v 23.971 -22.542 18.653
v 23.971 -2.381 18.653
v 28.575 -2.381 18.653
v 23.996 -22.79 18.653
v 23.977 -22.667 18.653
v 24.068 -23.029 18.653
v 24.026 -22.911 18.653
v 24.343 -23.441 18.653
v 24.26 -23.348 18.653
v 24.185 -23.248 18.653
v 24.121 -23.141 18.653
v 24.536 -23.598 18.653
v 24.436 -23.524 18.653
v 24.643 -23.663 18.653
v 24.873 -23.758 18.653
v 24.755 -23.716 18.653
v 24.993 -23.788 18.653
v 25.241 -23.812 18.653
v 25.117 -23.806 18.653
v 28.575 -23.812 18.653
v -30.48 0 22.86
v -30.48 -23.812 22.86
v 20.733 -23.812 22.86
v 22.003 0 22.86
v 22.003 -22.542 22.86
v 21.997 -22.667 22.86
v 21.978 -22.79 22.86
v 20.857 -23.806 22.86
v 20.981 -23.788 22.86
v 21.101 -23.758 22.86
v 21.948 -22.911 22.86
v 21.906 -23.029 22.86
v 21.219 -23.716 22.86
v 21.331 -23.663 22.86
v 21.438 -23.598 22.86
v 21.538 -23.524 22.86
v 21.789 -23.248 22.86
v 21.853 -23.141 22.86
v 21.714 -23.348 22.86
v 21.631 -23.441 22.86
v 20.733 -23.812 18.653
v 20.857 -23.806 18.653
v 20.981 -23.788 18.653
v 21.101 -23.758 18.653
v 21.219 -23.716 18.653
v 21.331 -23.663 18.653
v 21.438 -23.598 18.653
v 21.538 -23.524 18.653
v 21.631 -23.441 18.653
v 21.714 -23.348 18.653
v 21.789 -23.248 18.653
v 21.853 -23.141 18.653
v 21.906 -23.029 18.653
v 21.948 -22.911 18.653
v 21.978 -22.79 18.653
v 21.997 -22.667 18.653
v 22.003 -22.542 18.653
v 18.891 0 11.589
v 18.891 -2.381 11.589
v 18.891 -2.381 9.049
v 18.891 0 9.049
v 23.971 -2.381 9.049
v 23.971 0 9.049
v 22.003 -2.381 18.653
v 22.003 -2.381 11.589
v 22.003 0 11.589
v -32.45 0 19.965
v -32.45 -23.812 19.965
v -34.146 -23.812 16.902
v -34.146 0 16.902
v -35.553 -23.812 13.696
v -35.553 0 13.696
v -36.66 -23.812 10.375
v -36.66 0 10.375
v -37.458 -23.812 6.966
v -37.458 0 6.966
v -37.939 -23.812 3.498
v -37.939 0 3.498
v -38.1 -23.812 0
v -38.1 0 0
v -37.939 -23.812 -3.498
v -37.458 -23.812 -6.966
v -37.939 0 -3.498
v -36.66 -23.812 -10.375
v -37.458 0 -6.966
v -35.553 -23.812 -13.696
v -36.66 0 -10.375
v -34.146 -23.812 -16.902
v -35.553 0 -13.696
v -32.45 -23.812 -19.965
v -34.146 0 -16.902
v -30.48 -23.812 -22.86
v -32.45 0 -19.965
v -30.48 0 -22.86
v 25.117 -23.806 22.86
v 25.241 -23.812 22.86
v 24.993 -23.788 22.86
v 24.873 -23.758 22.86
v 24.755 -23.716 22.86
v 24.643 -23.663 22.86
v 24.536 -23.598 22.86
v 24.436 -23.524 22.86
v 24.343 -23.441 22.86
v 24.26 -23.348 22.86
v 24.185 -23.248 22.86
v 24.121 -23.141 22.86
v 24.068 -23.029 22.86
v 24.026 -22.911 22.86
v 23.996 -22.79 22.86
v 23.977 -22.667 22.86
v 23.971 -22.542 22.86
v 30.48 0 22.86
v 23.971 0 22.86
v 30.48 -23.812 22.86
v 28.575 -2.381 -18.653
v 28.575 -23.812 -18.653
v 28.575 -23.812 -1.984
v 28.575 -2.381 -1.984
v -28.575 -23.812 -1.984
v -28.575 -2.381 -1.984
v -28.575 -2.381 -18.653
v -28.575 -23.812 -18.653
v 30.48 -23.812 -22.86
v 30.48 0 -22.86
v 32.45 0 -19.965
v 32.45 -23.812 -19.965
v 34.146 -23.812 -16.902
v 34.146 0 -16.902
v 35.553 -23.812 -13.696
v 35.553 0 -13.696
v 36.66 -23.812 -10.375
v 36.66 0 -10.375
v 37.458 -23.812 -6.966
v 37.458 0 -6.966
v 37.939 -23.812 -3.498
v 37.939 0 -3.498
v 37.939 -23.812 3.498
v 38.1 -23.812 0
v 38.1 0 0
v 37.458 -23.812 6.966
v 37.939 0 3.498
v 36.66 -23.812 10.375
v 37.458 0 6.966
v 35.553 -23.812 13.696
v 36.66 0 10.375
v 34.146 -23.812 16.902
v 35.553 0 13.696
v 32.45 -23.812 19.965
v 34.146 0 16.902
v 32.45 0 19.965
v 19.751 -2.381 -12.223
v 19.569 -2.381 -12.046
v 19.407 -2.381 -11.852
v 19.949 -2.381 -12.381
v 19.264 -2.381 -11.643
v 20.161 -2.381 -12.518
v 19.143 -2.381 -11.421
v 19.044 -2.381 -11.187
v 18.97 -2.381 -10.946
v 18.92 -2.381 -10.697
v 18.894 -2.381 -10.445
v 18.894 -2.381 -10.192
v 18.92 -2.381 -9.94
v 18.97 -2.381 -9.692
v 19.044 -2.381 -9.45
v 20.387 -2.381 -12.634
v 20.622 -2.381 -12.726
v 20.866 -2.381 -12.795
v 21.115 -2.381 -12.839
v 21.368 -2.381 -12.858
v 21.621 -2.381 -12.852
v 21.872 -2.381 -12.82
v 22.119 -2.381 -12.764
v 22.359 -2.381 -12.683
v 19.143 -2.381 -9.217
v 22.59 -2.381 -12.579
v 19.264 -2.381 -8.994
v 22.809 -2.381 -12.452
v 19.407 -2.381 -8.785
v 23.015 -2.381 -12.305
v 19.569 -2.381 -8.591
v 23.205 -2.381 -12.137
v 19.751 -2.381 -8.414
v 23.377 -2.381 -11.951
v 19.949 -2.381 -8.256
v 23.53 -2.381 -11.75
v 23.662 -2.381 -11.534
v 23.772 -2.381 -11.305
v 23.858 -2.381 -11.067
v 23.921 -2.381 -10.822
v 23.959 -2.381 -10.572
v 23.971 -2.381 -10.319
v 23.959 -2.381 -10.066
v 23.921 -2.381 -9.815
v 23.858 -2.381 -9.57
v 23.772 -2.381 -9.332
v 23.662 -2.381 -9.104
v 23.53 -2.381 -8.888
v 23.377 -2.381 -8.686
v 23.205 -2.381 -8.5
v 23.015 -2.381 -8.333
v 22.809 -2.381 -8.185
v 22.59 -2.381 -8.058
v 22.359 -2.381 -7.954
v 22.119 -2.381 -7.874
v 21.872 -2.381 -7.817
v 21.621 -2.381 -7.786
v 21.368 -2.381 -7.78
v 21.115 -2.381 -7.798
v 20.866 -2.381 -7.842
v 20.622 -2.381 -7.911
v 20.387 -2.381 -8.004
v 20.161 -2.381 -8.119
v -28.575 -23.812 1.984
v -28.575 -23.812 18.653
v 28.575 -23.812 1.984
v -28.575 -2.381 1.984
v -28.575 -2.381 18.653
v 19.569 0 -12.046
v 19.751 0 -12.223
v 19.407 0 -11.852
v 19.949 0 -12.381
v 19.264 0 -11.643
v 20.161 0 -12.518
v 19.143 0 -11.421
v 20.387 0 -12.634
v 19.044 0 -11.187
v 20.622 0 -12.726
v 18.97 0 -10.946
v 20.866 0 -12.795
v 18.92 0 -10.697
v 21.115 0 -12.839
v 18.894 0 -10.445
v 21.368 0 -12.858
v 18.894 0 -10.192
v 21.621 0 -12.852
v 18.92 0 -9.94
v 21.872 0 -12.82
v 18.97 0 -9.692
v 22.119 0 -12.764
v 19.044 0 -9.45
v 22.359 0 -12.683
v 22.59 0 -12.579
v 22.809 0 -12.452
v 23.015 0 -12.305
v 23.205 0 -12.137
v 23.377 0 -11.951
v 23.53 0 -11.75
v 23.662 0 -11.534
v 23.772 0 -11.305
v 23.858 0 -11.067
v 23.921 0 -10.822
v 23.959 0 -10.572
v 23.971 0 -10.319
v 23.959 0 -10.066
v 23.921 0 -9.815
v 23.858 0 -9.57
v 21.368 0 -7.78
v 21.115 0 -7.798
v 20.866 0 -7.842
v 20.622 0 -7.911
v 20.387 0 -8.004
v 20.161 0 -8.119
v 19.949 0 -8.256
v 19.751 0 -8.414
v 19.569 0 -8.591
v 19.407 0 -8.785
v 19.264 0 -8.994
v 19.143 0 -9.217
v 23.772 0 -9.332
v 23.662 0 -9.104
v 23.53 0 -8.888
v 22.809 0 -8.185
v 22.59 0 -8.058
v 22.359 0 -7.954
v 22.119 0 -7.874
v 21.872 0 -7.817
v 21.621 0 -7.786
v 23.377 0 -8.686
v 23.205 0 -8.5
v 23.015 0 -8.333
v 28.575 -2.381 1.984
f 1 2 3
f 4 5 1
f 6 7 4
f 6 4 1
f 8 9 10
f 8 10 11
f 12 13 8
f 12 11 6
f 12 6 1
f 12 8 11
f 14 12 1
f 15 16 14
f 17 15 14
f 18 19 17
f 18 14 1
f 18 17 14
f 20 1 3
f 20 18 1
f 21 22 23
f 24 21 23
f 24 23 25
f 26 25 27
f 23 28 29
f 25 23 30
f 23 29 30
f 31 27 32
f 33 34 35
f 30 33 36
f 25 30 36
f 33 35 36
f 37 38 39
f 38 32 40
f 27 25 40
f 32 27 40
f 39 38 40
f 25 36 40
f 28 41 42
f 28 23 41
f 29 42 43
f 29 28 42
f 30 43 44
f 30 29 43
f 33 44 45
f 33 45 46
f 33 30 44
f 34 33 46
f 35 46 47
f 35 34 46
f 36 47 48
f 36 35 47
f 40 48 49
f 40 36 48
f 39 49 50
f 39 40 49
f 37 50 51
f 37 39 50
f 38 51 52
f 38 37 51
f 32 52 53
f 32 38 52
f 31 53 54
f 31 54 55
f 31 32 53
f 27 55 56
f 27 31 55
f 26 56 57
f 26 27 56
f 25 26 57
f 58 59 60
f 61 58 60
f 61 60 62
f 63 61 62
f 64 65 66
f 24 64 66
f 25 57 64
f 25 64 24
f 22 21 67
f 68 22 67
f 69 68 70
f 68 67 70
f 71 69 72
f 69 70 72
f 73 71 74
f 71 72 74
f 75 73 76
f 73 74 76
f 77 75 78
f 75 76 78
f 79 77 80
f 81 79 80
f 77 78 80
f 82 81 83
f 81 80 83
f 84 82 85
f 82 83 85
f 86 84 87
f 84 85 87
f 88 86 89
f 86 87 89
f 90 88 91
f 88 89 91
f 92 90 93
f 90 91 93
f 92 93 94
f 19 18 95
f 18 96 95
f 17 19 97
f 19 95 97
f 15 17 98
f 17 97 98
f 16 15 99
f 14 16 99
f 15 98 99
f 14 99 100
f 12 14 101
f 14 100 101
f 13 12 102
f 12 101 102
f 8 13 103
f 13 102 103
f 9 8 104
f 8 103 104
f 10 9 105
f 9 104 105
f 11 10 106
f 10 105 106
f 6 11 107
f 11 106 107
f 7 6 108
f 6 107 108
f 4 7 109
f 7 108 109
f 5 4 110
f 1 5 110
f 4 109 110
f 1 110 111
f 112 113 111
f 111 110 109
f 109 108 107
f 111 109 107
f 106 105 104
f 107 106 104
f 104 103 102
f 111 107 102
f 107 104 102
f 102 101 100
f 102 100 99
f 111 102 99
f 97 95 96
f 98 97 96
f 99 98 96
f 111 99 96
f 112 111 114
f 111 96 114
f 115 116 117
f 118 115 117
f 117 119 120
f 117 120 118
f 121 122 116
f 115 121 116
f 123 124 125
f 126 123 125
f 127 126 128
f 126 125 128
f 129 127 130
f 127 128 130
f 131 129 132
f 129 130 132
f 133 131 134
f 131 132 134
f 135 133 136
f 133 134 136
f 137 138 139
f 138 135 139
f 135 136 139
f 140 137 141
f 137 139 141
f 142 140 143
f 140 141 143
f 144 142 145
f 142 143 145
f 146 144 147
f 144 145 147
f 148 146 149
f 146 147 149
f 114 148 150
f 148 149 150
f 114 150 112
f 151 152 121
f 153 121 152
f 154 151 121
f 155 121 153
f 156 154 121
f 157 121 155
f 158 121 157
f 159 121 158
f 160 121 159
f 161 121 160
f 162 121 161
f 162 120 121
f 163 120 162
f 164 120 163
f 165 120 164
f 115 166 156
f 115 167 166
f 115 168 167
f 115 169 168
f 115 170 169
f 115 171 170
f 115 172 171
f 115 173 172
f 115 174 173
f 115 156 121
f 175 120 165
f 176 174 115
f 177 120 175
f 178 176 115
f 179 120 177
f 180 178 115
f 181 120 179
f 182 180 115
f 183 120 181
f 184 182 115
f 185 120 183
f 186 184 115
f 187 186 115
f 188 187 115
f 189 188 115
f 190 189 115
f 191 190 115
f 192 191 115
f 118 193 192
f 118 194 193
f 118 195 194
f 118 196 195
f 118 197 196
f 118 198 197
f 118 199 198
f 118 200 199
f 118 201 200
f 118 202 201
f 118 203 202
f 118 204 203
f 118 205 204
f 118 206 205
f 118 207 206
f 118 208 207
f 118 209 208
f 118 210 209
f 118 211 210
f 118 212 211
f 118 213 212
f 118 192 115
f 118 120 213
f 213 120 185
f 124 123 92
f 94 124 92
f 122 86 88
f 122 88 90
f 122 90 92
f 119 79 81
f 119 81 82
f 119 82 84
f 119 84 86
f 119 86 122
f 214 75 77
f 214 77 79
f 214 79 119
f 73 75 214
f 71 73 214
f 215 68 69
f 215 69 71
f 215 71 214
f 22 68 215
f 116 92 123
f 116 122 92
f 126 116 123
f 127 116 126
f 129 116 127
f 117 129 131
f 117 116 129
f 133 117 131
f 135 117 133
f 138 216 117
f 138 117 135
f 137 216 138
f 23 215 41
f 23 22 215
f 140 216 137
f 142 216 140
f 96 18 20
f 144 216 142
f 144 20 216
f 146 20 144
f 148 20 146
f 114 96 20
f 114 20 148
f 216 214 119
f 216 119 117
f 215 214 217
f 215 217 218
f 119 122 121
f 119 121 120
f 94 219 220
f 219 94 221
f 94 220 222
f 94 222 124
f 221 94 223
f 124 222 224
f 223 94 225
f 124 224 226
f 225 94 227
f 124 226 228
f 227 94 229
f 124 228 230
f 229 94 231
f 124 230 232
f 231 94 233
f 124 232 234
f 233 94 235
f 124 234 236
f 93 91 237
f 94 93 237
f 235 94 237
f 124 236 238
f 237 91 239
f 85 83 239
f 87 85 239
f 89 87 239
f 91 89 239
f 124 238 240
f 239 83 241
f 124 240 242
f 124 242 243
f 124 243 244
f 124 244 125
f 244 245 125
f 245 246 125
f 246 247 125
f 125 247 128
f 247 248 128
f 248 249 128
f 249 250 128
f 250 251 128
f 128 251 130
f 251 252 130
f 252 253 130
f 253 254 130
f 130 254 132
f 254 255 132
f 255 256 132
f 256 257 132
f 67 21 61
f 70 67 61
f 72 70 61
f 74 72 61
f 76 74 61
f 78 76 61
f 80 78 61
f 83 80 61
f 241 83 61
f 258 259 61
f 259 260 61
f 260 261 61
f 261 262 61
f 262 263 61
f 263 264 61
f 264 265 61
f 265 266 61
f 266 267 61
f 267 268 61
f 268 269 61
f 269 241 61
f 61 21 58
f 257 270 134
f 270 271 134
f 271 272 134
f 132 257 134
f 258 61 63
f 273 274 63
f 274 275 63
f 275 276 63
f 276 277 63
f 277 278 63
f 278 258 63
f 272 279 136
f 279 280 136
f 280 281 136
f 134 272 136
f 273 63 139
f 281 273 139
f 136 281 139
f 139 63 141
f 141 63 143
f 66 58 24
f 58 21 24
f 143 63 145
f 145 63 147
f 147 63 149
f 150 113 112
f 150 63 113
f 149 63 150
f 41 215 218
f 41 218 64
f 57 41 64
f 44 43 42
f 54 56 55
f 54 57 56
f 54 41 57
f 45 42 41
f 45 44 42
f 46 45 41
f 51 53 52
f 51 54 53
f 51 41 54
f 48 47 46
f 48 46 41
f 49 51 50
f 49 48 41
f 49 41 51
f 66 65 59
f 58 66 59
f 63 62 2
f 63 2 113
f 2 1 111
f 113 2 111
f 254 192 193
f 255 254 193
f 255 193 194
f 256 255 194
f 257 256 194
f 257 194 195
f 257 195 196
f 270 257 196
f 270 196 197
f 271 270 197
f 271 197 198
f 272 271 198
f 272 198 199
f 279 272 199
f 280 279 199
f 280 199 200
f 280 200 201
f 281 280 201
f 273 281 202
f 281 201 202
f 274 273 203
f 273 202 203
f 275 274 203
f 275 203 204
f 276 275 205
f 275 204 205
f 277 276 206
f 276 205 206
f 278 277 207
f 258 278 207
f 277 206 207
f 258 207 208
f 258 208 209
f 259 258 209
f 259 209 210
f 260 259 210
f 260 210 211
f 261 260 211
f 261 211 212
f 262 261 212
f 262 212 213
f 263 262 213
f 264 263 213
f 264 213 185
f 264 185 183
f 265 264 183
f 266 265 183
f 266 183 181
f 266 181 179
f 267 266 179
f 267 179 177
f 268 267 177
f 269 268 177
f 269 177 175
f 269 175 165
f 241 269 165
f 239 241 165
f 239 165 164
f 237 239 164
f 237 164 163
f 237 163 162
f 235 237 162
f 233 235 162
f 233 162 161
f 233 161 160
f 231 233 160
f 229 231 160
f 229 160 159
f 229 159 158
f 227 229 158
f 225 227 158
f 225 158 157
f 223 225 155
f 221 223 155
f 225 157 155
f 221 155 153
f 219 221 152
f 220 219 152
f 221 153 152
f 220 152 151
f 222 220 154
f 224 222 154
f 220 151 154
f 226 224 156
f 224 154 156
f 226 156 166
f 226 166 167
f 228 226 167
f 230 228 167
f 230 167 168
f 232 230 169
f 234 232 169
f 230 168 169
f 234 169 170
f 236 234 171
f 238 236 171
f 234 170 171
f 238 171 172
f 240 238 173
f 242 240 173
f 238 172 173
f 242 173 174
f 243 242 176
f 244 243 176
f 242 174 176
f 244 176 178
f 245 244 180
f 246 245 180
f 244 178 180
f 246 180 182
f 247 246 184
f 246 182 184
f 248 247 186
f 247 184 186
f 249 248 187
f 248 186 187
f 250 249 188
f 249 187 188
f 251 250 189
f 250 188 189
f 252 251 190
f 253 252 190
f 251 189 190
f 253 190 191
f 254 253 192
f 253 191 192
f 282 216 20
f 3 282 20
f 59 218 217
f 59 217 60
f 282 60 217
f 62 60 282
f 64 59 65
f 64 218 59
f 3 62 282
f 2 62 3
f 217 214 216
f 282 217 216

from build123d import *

# Parameters (mm, degrees)
F0_R     = 38.1
F1_DEPTH = 23.8125
F2_W     = 57.15
F2_H     = 16.66875
F3_DEPTH = 21.43125
F5_DEPTH = 25.4
F6_R     = 2.54
F6_W     = 1.9685
F6_H     = 12.000408
F7_DEPTH = 25.4
F8_R     = 1.27


with BuildPart() as f1:
    # F0 (on Front) → F1 (new body)
    with BuildSketch(Plane.XZ):
        Circle(F0_R)
    extrude(amount=F1_DEPTH)

    # F2 (on face) → F3 (cut)
    with BuildSketch(Plane.XZ.offset(23.8125)):
        with Locations((0, 10.31875)):
            Rectangle(F2_W, F2_H)
        with Locations((0, -10.31875)):
            Rectangle(F2_W, F2_H)
    extrude(amount=-F3_DEPTH, mode=Mode.SUBTRACT)

    # F4 (on face) → F5 (cut)
    with BuildSketch(Plane.XZ.offset(23.8125)):
        with BuildLine():
            Line((-30.48, 22.86), (30.48, 22.86))
            ThreePointArc((30.48, 22.86), (0, 38.1), (-30.48, 22.86))
        make_face()
        with BuildLine():
            ThreePointArc((-30.48, -22.86), (0, -38.1), (30.48, -22.86))
            Line((30.48, -22.86), (-30.48, -22.86))
        make_face()
    extrude(amount=-F5_DEPTH, mode=Mode.SUBTRACT)

    # F6 (on face) → F7 (cut, symmetric)
    with BuildSketch(Plane.XZ.offset(2.38125)):
        with Locations((21.43125, -10.31875)):
            Circle(F6_R)
        Polygon((18.89125, 9.04875), (23.97125, 9.04875), (23.97125, 11.58875), (22.00275, 11.58875), (18.89125, 11.58875), align=None)
        with Locations((22.987, 17.588954)):
            Rectangle(F6_W, F6_H)
    extrude(amount=F7_DEPTH, both=True, mode=Mode.SUBTRACT)

    # F8
    f8_edges = [f1.edges().sort_by_distance(p)[0] for p in [
        (23.97125, -23.8125, 20.756562),
        (22.00275, -23.8125, 20.756562),
    ]]
    fillet(f8_edges, radius=F8_R)


solid = f1.part
